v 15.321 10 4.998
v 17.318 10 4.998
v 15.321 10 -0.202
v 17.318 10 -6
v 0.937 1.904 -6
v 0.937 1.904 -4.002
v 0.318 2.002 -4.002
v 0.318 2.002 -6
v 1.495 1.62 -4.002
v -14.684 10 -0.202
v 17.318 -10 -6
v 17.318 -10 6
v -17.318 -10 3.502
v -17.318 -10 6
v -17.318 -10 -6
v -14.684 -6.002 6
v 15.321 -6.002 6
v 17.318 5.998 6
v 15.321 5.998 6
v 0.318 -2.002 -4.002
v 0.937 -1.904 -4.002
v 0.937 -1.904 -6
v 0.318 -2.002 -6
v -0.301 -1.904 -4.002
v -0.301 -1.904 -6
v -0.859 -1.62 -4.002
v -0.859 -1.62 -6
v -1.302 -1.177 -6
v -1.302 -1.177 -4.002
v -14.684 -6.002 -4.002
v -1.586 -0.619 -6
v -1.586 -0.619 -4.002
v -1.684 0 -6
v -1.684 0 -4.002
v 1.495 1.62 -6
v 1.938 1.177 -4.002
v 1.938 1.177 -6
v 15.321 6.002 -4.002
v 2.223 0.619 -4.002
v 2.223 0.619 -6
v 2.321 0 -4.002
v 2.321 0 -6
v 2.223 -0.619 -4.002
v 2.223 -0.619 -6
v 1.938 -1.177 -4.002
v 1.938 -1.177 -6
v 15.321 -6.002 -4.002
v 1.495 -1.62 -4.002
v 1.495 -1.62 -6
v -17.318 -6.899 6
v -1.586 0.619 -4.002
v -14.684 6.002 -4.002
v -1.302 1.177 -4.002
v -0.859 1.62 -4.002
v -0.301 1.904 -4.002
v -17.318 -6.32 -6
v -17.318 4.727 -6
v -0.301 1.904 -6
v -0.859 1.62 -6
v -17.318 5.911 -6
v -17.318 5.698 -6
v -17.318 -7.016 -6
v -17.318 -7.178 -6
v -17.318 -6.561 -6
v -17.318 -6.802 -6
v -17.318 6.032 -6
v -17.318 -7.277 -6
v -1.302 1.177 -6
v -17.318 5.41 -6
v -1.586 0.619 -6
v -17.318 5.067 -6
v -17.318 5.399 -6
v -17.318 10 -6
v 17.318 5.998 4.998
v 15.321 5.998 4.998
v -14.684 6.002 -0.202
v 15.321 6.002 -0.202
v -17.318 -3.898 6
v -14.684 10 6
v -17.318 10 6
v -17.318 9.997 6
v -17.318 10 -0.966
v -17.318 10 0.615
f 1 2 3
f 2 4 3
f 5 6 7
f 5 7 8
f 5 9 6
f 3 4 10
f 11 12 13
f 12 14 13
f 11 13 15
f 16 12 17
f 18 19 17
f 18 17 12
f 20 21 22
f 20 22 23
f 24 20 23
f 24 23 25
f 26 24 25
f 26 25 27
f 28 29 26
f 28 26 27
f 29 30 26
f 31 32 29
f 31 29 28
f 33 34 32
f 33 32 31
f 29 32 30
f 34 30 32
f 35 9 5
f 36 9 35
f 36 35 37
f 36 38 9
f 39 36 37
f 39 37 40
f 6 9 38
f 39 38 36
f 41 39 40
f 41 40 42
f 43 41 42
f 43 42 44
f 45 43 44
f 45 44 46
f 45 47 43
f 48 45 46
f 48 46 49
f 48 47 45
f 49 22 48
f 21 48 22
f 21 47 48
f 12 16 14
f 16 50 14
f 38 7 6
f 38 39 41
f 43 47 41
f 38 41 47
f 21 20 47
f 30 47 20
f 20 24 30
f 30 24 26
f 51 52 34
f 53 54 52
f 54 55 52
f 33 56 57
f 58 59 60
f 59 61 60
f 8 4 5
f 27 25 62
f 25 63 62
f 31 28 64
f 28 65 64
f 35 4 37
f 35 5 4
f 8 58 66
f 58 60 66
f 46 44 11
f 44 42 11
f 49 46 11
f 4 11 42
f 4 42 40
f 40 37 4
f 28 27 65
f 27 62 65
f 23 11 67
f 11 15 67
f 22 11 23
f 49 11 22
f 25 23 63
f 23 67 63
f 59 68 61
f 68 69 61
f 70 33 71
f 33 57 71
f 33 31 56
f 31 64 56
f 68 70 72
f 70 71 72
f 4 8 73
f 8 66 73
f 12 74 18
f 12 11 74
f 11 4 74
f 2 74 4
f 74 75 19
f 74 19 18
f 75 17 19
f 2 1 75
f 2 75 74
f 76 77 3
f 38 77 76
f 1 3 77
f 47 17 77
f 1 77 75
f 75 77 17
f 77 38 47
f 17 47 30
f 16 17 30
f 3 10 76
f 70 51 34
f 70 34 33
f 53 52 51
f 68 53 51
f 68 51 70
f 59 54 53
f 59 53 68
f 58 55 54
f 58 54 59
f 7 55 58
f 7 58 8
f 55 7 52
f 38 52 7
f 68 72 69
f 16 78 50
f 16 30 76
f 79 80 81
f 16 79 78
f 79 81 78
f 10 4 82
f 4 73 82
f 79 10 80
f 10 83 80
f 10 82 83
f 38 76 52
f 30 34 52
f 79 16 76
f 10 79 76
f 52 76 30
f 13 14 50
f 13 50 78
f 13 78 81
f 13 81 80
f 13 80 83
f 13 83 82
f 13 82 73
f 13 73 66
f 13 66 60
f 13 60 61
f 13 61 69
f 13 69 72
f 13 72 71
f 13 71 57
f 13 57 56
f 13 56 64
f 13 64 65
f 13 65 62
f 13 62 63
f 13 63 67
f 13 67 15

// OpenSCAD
// Parametric/customizer wrapper for the original hotbed_foot.stl geometry.
// Self-contained: this file does not import or reference the source STL.
// Defaults intentionally match hotbed_foot_v2.scad and the original STL dimensions.
// Wall-strength options add material outside the source shape so inner geometry stays intact.

/* [Foot body] */
// Use Original STL to keep the exact source dimensions.
foot_size_preset = "Original STL"; // [Original STL, Custom]
// Custom left-to-right size; used only when foot_size_preset is Custom.
custom_foot_length = 34.63543701; // [20:0.1:80]
// Custom front-to-back size; used only when foot_size_preset is Custom.
custom_foot_width = 20; // [10:0.1:60]
// Custom bottom-to-top size; used only when foot_size_preset is Custom.
custom_foot_height = 12; // [4:0.1:40]

/* [Large notch opening] */
// Original STL keeps the notch exactly as modeled in the STL.
large_notch_preset = "Original STL"; // [Original STL, Wider, Narrower, Deeper, Shallower, Custom]
// Custom left/right scale for the large notch area; used only when large_notch_preset is Custom.
custom_large_notch_width_scale = 1.00; // [0.5:0.01:1.5]
// Custom front/back scale for the large notch area; used only when large_notch_preset is Custom.
custom_large_notch_depth_scale = 1.00; // [0.5:0.01:1.5]


/* [Wall strength] */
// Original STL adds no extra wall material. Strength presets expand outward only.
wall_strength_preset = "Original STL"; // [Original STL, +1 mm, +2 mm, Custom]
// Custom outward wall expansion; used only when wall_strength_preset is Custom.
custom_wall_expansion = 0.00; // [0:0.1:8]
// Which outside walls get extra material. Inner openings are not subtracted or resized.
wall_expansion_area = "Sides and Back"; // [Sides and Back, Sides Only, Back Only, All Outside]

/* [Top wall notch] */
// Original Left matches the source STL. Mirrored Right flips the foot so the notch moves to the other side.
top_notch_side = "Original Left"; // [Original Left, Mirrored Right]

/* [Placement] */
// Centered opens visibly at the origin; Source STL places the part at the original STL coordinates.
model_position = "Centered"; // [Centered, Source STL]

orig_length = 34.63543701;
orig_width = 20;
orig_height = 12;
source_center = [149.8822937, 138.25900269, 6];

function resolved_length() = foot_size_preset == "Original STL" ? orig_length : custom_foot_length;
function resolved_width() = foot_size_preset == "Original STL" ? orig_width : custom_foot_width;
function resolved_height() = foot_size_preset == "Original STL" ? orig_height : custom_foot_height;

function large_notch_width_scale() =
  large_notch_preset == "Wider" ? 1.10 :
  large_notch_preset == "Narrower" ? 0.90 :
  large_notch_preset == "Custom" ? custom_large_notch_width_scale :
  1.00;

function large_notch_depth_scale() =
  large_notch_preset == "Deeper" ? 1.10 :
  large_notch_preset == "Shallower" ? 0.90 :
  large_notch_preset == "Custom" ? custom_large_notch_depth_scale :
  1.00;


function wall_expansion_amount() =
  wall_strength_preset == "+1 mm" ? 1.00 :
  wall_strength_preset == "+2 mm" ? 2.00 :
  wall_strength_preset == "Custom" ? custom_wall_expansion :
  0.00;

module outside_wall_reinforcement(length, width, height, expansion, area) {
  overlap = 0.02;
  if (expansion > 0) {
    union() {
      if (area == "Sides and Back" || area == "Sides Only" || area == "All Outside") {
        translate([-length / 2 - expansion, -width / 2, -height / 2])
          cube([expansion + overlap, width, height]);
        translate([length / 2 - overlap, -width / 2, -height / 2])
          cube([expansion + overlap, width, height]);
      }

      if (area == "Sides and Back" || area == "Back Only" || area == "All Outside") {
        translate([-length / 2 - (area == "All Outside" ? expansion : 0), width / 2 - overlap, -height / 2])
          cube([length + (area == "All Outside" ? 2 * expansion : 0), expansion + overlap, height]);
      }

      if (area == "All Outside") {
        translate([-length / 2 - expansion, -width / 2 - expansion, -height / 2])
          cube([length + 2 * expansion, expansion + overlap, height]);
      }
    }
  }
}

module hotbed_foot_original_mesh_v5() {
  polyhedron(
    points = [
      [15.32070923, 10, 4.9980011],
      [17.31771851, 10, 4.9980011],
      [15.32070923, 10, -0.20199966],
      [17.31771851, 10, -6],
      [0.93670654, 1.9039917, -6],
      [0.93670654, 1.9039917, -4.0019989],
      [0.31771851, 2.0019989, -4.0019989],
      [0.31771851, 2.0019989, -6],
      [1.4947052, 1.61999512, -4.0019989],
      [-14.68429565, 10, -0.20199966],
      [17.31771851, -10, -6],
      [17.31771851, -10, 6],
      [-17.31771851, -10, 3.50236511],
      [-17.31771851, -10, 6],
      [-17.31771851, -10, -6],
      [-14.68429565, -6.0019989, 6],
      [15.32070923, -6.0019989, 6],
      [17.31771851, 5.9980011, 6],
      [15.32070923, 5.9980011, 6],
      [0.31771851, -2.0019989, -4.0019989],
      [0.93670654, -1.90400696, -4.0019989],
      [0.93670654, -1.90400696, -6],
      [0.31771851, -2.0019989, -6],
      [-0.30130005, -1.90400696, -4.0019989],
      [-0.30130005, -1.90400696, -6],
      [-0.85929871, -1.61999512, -4.0019989],
      [-0.85929871, -1.61999512, -6],
      [-1.30229187, -1.17700195, -6],
      [-1.30229187, -1.17700195, -4.0019989],
      [-14.68429565, -6.0019989, -4.0019989],
      [-1.58628845, -0.6190033, -6],
      [-1.58628845, -0.6190033, -4.0019989],
      [-1.68429565, 0, -6],
      [-1.68429565, 0, -4.0019989],
      [1.4947052, 1.61999512, -6],
      [1.93771362, 1.17700195, -4.0019989],
      [1.93771362, 1.17700195, -6],
      [15.32070923, 6.0019989, -4.0019989],
      [2.22271729, 0.61898804, -4.0019989],
      [2.22271729, 0.61898804, -6],
      [2.32070923, 0, -4.0019989],
      [2.32070923, 0, -6],
      [2.22271729, -0.6190033, -4.0019989],
      [2.22271729, -0.6190033, -6],
      [1.93771362, -1.17700195, -4.0019989],
      [1.93771362, -1.17700195, -6],
      [15.32070923, -6.0019989, -4.0019989],
      [1.4947052, -1.61999512, -4.0019989],
      [1.4947052, -1.61999512, -6],
      [-17.31771851, -6.89901733, 6],
      [-1.58628845, 0.61898804, -4.0019989],
      [-14.68429565, 6.0019989, -4.0019989],
      [-1.30229187, 1.17700195, -4.0019989],
      [-0.85929871, 1.61999512, -4.0019989],
      [-0.30130005, 1.9039917, -4.0019989],
      [-17.31771851, -6.31982422, -6],
      [-17.31771851, 4.72679138, -6],
      [-0.30130005, 1.9039917, -6],
      [-0.85929871, 1.61999512, -6],
      [-17.31771851, 5.91101074, -6],
      [-17.31771851, 5.69773865, -6],
      [-17.31771851, -7.01554871, -6],
      [-17.31771851, -7.17828369, -6],
      [-17.31771851, -6.56124878, -6],
      [-17.31771851, -6.80236816, -6],
      [-17.31771851, 6.03193665, -6],
      [-17.31771851, -7.27697754, -6],
      [-1.30229187, 1.17700195, -6],
      [-17.31771851, 5.41018677, -6],
      [-1.58628845, 0.61898804, -6],
      [-17.31771851, 5.06710815, -6],
      [-17.31771851, 5.39915466, -6],
      [-17.31771851, 10, -6],
      [17.31771851, 5.9980011, 4.9980011],
      [15.32070923, 5.9980011, 4.9980011],
      [-14.68429565, 6.0019989, -0.20199966],
      [15.32070923, 6.0019989, -0.20199966],
      [-17.31771851, -3.89782715, 6],
      [-14.68429565, 10, 6],
      [-17.31771851, 10, 6],
      [-17.31771851, 9.9969635, 6],
      [-17.31771851, 10, -0.96550751],
      [-17.31771851, 10, 0.61470413],
    ],
    faces = [
      [2, 1, 0],
      [2, 3, 1],
      [6, 5, 4],
      [7, 6, 4],
      [5, 8, 4],
      [9, 3, 2],
      [12, 11, 10],
      [12, 13, 11],
      [14, 12, 10],
      [16, 11, 15],
      [16, 18, 17],
      [11, 16, 17],
      [21, 20, 19],
      [22, 21, 19],
      [22, 19, 23],
      [24, 22, 23],
      [24, 23, 25],
      [26, 24, 25],
      [25, 28, 27],
      [26, 25, 27],
      [25, 29, 28],
      [28, 31, 30],
      [27, 28, 30],
      [31, 33, 32],
      [30, 31, 32],
      [29, 31, 28],
      [31, 29, 33],
      [4, 8, 34],
      [34, 8, 35],
      [36, 34, 35],
      [8, 37, 35],
      [36, 35, 38],
      [39, 36, 38],
      [37, 8, 5],
      [35, 37, 38],
      [39, 38, 40],
      [41, 39, 40],
      [41, 40, 42],
      [43, 41, 42],
      [43, 42, 44],
      [45, 43, 44],
      [42, 46, 44],
      [45, 44, 47],
      [48, 45, 47],
      [44, 46, 47],
      [47, 21, 48],
      [21, 47, 20],
      [47, 46, 20],
      [13, 15, 11],
      [13, 49, 15],
      [5, 6, 37],
      [40, 38, 37],
      [40, 46, 42],
      [46, 40, 37],
      [46, 19, 20],
      [19, 46, 29],
      [29, 23, 19],
      [25, 23, 29],
      [33, 51, 50],
      [51, 53, 52],
      [51, 54, 53],
      [56, 55, 32],
      [59, 58, 57],
      [59, 60, 58],
      [4, 3, 7],
      [61, 24, 26],
      [61, 62, 24],
      [63, 27, 30],
      [63, 64, 27],
      [36, 3, 34],
      [3, 4, 34],
      [65, 57, 7],
      [65, 59, 57],
      [10, 43, 45],
      [10, 41, 43],
      [10, 45, 48],
      [41, 10, 3],
      [39, 41, 3],
      [3, 36, 39],
      [64, 26, 27],
      [64, 61, 26],
      [66, 10, 22],
      [66, 14, 10],
      [22, 10, 21],
      [21, 10, 48],
      [62, 22, 24],
      [62, 66, 22],
      [60, 67, 58],
      [60, 68, 67],
      [70, 32, 69],
      [70, 56, 32],
      [55, 30, 32],
      [55, 63, 30],
      [71, 69, 67],
      [71, 70, 69],
      [72, 7, 3],
      [72, 65, 7],
      [17, 73, 11],
      [73, 10, 11],
      [73, 3, 10],
      [3, 73, 1],
      [18, 74, 73],
      [17, 18, 73],
      [18, 16, 74],
      [74, 0, 1],
      [73, 74, 1],
      [2, 76, 75],
      [75, 76, 37],
      [76, 2, 0],
      [76, 16, 46],
      [74, 76, 0],
      [16, 76, 74],
      [46, 37, 76],
      [29, 46, 16],
      [29, 16, 15],
      [75, 9, 2],
      [33, 50, 69],
      [32, 33, 69],
      [50, 51, 52],
      [50, 52, 67],
      [69, 50, 67],
      [52, 53, 58],
      [67, 52, 58],
      [53, 54, 57],
      [58, 53, 57],
      [57, 54, 6],
      [7, 57, 6],
      [51, 6, 54],
      [6, 51, 37],
      [68, 71, 67],
      [49, 77, 15],
      [75, 29, 15],
      [80, 79, 78],
      [77, 78, 15],
      [77, 80, 78],
      [81, 3, 9],
      [81, 72, 3],
      [79, 9, 78],
      [79, 82, 9],
      [82, 81, 9],
      [51, 75, 37],
      [51, 33, 29],
      [75, 15, 78],
      [75, 78, 9],
      [29, 75, 51],
      [49, 13, 12],
      [77, 49, 12],
      [80, 77, 12],
      [79, 80, 12],
      [82, 79, 12],
      [81, 82, 12],
      [72, 81, 12],
      [65, 72, 12],
      [59, 65, 12],
      [60, 59, 12],
      [68, 60, 12],
      [71, 68, 12],
      [70, 71, 12],
      [56, 70, 12],
      [55, 56, 12],
      [63, 55, 12],
      [64, 63, 12],
      [61, 64, 12],
      [62, 61, 12],
      [66, 62, 12],
      [14, 66, 12],
    ],
    convexity = 10
  );
}

module hotbed_foot_v5(
  position = model_position,
  notch_side = top_notch_side
) {
  placement = position == "Source STL" ? source_center : [0, 0, 0];
  body_scale = [resolved_length() / orig_length, resolved_width() / orig_width, resolved_height() / orig_height];
  notch_scale = [large_notch_width_scale(), large_notch_depth_scale(), 1];
  mirror_for_notch = notch_side == "Mirrored Right" ? [-1, 1, 1] : [1, 1, 1];

  translate(placement)
    scale(body_scale)
      union() {
        scale(mirror_for_notch)
          // The notch-scale control is centered on the original mesh so Original STL remains exact at 1.00.
          scale(notch_scale)
            hotbed_foot_original_mesh_v5();

        // Reinforcement is added outside the original bounding box only, preserving all inner/source geometry.
        outside_wall_reinforcement(orig_length, orig_width, orig_height, wall_expansion_amount(), wall_expansion_area);
      }
}

hotbed_foot_v5();
